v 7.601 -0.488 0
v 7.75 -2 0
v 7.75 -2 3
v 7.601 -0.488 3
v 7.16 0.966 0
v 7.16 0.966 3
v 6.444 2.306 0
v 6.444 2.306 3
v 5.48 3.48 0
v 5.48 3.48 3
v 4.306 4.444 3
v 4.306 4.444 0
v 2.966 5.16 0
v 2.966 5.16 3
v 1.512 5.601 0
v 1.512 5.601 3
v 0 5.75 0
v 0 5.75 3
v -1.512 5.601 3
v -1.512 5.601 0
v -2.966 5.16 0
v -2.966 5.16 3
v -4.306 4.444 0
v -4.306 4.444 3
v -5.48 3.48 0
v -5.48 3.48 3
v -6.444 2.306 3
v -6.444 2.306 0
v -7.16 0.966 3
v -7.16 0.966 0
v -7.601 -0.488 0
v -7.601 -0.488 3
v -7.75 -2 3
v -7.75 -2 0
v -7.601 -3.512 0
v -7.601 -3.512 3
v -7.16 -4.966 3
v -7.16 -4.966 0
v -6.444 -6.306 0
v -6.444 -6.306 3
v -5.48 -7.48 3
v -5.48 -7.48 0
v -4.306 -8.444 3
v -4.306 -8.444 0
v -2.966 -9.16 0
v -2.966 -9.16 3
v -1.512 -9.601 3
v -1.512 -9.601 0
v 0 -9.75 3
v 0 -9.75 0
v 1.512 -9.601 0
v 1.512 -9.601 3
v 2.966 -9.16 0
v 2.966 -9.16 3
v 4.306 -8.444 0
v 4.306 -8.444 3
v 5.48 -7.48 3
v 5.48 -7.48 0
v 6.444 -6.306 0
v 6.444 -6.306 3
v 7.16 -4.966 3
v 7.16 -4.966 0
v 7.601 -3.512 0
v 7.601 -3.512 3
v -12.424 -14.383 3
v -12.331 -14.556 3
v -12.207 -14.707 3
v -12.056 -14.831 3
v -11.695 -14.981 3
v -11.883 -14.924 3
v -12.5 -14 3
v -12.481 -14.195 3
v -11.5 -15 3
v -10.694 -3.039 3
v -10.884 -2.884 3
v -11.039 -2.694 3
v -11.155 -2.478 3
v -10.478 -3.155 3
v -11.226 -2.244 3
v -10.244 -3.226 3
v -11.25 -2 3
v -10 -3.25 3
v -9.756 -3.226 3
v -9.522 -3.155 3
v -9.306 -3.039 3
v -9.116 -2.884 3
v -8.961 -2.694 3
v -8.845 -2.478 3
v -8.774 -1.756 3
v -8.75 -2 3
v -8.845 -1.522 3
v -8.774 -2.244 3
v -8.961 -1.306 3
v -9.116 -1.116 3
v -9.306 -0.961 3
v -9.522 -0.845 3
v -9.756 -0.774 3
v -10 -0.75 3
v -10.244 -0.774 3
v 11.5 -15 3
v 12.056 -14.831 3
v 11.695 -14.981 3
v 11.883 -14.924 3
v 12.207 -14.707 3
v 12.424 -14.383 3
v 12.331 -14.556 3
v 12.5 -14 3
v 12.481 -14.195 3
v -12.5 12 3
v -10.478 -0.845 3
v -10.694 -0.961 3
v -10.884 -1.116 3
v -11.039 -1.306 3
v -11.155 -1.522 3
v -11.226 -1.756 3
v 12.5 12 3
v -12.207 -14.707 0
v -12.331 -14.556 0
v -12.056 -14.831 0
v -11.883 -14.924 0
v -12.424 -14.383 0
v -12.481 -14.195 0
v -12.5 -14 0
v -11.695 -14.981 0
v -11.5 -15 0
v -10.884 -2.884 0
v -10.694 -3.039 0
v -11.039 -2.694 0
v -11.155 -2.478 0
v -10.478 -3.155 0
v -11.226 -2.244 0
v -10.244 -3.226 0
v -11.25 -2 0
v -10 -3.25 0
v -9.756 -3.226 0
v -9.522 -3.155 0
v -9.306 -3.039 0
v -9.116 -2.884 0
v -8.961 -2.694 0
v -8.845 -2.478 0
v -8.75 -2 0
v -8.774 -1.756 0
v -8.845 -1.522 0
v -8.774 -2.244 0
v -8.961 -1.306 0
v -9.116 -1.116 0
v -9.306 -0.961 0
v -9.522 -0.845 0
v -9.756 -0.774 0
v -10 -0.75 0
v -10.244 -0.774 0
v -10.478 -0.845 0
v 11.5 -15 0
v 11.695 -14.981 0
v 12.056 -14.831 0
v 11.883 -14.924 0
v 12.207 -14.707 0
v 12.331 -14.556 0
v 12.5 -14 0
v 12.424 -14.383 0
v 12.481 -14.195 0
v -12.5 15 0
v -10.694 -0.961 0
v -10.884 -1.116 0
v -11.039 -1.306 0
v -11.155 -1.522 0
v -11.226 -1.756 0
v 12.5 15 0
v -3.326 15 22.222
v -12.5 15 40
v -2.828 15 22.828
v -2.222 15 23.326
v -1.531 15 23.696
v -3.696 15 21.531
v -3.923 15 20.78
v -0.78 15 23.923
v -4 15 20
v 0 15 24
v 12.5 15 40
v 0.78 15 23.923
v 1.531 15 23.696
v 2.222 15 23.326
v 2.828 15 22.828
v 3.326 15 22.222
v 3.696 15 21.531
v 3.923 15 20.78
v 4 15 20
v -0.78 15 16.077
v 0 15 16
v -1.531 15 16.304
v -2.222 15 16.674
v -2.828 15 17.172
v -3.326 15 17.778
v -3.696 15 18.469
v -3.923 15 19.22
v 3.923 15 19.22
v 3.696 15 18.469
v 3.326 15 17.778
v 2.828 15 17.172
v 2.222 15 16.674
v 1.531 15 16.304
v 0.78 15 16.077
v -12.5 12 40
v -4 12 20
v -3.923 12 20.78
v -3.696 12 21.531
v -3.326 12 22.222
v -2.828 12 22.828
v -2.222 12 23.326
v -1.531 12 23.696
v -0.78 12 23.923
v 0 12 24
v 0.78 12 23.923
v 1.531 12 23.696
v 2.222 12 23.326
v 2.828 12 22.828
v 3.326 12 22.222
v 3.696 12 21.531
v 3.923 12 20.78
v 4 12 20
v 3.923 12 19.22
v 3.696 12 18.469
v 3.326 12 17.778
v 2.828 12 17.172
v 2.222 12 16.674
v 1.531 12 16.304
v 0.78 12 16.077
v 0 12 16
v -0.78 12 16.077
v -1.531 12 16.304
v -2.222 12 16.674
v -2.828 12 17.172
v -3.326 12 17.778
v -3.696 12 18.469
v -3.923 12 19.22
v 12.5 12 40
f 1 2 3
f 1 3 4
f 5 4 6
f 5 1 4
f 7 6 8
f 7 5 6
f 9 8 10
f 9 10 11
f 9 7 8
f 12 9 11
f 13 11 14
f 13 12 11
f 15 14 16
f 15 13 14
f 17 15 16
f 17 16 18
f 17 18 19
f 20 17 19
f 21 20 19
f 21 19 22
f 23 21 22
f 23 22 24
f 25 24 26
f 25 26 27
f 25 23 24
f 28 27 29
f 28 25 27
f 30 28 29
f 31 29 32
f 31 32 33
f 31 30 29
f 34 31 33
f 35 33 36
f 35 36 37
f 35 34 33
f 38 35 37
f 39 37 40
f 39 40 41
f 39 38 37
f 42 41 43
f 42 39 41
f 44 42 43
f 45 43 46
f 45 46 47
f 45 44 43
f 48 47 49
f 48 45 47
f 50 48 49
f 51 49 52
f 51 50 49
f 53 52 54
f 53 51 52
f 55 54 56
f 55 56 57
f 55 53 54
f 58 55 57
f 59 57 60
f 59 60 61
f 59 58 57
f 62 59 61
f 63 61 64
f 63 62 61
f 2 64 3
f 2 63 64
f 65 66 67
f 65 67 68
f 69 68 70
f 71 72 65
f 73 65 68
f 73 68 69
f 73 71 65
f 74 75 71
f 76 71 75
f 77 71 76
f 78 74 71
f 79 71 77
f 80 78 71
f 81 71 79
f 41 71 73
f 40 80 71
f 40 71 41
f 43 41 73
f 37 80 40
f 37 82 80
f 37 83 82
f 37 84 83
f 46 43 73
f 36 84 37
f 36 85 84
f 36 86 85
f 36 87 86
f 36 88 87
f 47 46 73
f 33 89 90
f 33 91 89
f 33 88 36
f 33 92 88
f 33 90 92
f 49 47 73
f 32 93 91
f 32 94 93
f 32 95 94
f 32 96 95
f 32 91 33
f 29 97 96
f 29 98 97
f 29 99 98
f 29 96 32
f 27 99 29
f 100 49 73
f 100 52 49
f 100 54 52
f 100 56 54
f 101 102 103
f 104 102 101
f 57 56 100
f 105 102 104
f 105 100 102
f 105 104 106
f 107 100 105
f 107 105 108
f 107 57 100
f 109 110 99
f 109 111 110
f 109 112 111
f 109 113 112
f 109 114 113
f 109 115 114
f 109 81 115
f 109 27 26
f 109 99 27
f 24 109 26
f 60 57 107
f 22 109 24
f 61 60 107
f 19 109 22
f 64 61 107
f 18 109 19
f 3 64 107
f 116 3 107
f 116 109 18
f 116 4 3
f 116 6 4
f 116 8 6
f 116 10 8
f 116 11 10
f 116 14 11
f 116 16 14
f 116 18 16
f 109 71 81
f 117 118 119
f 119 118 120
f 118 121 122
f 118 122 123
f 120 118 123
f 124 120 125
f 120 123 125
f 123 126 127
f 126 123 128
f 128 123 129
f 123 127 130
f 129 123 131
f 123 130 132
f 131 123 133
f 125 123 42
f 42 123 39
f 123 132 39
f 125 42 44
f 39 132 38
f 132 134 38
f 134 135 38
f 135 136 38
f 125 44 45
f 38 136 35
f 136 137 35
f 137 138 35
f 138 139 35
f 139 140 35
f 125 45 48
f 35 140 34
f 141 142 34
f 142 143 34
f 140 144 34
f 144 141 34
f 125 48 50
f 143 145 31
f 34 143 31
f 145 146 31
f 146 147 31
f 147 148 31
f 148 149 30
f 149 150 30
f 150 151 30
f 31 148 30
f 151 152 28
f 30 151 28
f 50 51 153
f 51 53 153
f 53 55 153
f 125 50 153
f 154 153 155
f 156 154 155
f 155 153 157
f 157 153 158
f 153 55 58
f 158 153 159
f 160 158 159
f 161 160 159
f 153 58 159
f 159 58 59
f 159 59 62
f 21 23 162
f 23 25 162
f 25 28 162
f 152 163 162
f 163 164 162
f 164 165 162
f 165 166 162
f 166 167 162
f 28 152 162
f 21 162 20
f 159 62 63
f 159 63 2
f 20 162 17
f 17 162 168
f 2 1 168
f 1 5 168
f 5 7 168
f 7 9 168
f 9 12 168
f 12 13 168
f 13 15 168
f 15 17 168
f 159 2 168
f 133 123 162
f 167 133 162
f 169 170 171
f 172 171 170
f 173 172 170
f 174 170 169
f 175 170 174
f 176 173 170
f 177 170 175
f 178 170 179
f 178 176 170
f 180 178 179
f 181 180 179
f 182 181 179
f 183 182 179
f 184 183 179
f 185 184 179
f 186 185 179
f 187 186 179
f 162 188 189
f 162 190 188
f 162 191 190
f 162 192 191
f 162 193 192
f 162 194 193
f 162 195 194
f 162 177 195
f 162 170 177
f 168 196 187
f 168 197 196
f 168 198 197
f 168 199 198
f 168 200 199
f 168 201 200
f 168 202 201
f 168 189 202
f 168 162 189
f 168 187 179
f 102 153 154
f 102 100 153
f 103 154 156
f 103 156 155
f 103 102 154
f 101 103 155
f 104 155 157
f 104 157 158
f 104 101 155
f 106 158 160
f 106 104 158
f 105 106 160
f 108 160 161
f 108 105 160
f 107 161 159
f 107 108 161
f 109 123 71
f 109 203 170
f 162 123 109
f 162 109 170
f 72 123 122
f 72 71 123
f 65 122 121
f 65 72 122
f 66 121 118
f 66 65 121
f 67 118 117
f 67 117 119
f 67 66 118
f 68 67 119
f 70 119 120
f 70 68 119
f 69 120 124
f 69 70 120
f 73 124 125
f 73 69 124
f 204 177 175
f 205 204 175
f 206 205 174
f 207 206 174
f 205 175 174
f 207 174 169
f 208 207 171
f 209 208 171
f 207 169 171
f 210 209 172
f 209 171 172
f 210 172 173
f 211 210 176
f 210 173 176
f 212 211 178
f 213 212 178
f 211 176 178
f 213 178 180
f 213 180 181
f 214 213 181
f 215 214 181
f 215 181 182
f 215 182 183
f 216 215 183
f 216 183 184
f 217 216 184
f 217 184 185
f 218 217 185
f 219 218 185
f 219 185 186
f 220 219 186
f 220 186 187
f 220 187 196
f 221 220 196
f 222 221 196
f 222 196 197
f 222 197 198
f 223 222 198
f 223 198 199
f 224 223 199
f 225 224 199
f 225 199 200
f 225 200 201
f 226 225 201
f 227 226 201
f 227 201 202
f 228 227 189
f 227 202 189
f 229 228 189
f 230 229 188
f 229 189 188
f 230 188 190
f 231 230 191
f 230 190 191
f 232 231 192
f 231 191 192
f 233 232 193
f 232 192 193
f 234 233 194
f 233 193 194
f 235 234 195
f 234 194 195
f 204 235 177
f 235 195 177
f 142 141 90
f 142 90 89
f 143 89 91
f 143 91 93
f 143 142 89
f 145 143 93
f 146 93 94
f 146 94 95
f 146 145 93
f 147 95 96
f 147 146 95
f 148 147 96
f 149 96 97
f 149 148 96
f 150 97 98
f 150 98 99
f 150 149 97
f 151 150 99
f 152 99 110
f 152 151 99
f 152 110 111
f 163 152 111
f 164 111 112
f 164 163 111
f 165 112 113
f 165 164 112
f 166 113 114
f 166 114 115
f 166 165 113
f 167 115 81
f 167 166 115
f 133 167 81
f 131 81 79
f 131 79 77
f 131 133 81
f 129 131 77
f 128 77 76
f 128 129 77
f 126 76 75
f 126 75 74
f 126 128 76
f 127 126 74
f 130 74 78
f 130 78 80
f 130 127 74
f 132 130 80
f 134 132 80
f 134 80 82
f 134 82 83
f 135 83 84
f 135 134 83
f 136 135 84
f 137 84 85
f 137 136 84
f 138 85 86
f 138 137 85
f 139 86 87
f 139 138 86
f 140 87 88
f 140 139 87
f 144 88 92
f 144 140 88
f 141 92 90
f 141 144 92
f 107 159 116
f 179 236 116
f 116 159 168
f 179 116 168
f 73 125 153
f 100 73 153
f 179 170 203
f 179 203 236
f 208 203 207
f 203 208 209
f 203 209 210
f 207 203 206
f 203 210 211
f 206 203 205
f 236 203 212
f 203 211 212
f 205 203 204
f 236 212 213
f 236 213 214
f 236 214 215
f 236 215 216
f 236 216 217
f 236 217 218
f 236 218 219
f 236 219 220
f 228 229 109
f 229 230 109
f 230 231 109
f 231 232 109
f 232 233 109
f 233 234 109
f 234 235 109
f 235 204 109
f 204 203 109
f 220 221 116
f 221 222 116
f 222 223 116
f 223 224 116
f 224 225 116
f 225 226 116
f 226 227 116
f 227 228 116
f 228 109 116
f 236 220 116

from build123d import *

# Parameters (mm, degrees)
F0_W     = 25
F0_H     = 27
F0_R     = 1.25
F0_R_2   = 7.75
F1_DEPTH = 3
F0_H_2   = 3
F2_DEPTH = 40
F3_R     = 4
F4_DEPTH = 25
F5_R     = 1


with BuildPart() as f1:
    # F0 (on Top) → F1 (new body)
    with BuildSketch(Plane.XY):
        with Locations((0, -1.5)):
            Rectangle(F0_W, F0_H)
        with Locations((-10, -2)):
            Circle(F0_R, mode=Mode.SUBTRACT)
        with Locations((0, -2)):
            Circle(F0_R_2, mode=Mode.SUBTRACT)
    extrude(amount=F1_DEPTH)

    # F0 (on Top) → F2 (join)
    with BuildSketch(Plane.XY):
        with Locations((0, 13.5)):
            Rectangle(F0_W, F0_H_2)
    extrude(amount=F2_DEPTH)

    # F3 (on face) → F4 (cut)
    with BuildSketch(Plane(origin=(0, 15, 0), x_dir=(-1, 0, 0), z_dir=(0, 1, 0))):
        with Locations((0, 20)):
            Circle(F3_R)
    extrude(amount=-F4_DEPTH, mode=Mode.SUBTRACT)

    # F5
    f5_edges = [f1.edges().sort_by_distance(p)[0] for p in [
        (12.5, -15, 1.5),
        (-12.5, -15, 1.5),
    ]]
    fillet(f5_edges, radius=F5_R)


solid = f1.part
